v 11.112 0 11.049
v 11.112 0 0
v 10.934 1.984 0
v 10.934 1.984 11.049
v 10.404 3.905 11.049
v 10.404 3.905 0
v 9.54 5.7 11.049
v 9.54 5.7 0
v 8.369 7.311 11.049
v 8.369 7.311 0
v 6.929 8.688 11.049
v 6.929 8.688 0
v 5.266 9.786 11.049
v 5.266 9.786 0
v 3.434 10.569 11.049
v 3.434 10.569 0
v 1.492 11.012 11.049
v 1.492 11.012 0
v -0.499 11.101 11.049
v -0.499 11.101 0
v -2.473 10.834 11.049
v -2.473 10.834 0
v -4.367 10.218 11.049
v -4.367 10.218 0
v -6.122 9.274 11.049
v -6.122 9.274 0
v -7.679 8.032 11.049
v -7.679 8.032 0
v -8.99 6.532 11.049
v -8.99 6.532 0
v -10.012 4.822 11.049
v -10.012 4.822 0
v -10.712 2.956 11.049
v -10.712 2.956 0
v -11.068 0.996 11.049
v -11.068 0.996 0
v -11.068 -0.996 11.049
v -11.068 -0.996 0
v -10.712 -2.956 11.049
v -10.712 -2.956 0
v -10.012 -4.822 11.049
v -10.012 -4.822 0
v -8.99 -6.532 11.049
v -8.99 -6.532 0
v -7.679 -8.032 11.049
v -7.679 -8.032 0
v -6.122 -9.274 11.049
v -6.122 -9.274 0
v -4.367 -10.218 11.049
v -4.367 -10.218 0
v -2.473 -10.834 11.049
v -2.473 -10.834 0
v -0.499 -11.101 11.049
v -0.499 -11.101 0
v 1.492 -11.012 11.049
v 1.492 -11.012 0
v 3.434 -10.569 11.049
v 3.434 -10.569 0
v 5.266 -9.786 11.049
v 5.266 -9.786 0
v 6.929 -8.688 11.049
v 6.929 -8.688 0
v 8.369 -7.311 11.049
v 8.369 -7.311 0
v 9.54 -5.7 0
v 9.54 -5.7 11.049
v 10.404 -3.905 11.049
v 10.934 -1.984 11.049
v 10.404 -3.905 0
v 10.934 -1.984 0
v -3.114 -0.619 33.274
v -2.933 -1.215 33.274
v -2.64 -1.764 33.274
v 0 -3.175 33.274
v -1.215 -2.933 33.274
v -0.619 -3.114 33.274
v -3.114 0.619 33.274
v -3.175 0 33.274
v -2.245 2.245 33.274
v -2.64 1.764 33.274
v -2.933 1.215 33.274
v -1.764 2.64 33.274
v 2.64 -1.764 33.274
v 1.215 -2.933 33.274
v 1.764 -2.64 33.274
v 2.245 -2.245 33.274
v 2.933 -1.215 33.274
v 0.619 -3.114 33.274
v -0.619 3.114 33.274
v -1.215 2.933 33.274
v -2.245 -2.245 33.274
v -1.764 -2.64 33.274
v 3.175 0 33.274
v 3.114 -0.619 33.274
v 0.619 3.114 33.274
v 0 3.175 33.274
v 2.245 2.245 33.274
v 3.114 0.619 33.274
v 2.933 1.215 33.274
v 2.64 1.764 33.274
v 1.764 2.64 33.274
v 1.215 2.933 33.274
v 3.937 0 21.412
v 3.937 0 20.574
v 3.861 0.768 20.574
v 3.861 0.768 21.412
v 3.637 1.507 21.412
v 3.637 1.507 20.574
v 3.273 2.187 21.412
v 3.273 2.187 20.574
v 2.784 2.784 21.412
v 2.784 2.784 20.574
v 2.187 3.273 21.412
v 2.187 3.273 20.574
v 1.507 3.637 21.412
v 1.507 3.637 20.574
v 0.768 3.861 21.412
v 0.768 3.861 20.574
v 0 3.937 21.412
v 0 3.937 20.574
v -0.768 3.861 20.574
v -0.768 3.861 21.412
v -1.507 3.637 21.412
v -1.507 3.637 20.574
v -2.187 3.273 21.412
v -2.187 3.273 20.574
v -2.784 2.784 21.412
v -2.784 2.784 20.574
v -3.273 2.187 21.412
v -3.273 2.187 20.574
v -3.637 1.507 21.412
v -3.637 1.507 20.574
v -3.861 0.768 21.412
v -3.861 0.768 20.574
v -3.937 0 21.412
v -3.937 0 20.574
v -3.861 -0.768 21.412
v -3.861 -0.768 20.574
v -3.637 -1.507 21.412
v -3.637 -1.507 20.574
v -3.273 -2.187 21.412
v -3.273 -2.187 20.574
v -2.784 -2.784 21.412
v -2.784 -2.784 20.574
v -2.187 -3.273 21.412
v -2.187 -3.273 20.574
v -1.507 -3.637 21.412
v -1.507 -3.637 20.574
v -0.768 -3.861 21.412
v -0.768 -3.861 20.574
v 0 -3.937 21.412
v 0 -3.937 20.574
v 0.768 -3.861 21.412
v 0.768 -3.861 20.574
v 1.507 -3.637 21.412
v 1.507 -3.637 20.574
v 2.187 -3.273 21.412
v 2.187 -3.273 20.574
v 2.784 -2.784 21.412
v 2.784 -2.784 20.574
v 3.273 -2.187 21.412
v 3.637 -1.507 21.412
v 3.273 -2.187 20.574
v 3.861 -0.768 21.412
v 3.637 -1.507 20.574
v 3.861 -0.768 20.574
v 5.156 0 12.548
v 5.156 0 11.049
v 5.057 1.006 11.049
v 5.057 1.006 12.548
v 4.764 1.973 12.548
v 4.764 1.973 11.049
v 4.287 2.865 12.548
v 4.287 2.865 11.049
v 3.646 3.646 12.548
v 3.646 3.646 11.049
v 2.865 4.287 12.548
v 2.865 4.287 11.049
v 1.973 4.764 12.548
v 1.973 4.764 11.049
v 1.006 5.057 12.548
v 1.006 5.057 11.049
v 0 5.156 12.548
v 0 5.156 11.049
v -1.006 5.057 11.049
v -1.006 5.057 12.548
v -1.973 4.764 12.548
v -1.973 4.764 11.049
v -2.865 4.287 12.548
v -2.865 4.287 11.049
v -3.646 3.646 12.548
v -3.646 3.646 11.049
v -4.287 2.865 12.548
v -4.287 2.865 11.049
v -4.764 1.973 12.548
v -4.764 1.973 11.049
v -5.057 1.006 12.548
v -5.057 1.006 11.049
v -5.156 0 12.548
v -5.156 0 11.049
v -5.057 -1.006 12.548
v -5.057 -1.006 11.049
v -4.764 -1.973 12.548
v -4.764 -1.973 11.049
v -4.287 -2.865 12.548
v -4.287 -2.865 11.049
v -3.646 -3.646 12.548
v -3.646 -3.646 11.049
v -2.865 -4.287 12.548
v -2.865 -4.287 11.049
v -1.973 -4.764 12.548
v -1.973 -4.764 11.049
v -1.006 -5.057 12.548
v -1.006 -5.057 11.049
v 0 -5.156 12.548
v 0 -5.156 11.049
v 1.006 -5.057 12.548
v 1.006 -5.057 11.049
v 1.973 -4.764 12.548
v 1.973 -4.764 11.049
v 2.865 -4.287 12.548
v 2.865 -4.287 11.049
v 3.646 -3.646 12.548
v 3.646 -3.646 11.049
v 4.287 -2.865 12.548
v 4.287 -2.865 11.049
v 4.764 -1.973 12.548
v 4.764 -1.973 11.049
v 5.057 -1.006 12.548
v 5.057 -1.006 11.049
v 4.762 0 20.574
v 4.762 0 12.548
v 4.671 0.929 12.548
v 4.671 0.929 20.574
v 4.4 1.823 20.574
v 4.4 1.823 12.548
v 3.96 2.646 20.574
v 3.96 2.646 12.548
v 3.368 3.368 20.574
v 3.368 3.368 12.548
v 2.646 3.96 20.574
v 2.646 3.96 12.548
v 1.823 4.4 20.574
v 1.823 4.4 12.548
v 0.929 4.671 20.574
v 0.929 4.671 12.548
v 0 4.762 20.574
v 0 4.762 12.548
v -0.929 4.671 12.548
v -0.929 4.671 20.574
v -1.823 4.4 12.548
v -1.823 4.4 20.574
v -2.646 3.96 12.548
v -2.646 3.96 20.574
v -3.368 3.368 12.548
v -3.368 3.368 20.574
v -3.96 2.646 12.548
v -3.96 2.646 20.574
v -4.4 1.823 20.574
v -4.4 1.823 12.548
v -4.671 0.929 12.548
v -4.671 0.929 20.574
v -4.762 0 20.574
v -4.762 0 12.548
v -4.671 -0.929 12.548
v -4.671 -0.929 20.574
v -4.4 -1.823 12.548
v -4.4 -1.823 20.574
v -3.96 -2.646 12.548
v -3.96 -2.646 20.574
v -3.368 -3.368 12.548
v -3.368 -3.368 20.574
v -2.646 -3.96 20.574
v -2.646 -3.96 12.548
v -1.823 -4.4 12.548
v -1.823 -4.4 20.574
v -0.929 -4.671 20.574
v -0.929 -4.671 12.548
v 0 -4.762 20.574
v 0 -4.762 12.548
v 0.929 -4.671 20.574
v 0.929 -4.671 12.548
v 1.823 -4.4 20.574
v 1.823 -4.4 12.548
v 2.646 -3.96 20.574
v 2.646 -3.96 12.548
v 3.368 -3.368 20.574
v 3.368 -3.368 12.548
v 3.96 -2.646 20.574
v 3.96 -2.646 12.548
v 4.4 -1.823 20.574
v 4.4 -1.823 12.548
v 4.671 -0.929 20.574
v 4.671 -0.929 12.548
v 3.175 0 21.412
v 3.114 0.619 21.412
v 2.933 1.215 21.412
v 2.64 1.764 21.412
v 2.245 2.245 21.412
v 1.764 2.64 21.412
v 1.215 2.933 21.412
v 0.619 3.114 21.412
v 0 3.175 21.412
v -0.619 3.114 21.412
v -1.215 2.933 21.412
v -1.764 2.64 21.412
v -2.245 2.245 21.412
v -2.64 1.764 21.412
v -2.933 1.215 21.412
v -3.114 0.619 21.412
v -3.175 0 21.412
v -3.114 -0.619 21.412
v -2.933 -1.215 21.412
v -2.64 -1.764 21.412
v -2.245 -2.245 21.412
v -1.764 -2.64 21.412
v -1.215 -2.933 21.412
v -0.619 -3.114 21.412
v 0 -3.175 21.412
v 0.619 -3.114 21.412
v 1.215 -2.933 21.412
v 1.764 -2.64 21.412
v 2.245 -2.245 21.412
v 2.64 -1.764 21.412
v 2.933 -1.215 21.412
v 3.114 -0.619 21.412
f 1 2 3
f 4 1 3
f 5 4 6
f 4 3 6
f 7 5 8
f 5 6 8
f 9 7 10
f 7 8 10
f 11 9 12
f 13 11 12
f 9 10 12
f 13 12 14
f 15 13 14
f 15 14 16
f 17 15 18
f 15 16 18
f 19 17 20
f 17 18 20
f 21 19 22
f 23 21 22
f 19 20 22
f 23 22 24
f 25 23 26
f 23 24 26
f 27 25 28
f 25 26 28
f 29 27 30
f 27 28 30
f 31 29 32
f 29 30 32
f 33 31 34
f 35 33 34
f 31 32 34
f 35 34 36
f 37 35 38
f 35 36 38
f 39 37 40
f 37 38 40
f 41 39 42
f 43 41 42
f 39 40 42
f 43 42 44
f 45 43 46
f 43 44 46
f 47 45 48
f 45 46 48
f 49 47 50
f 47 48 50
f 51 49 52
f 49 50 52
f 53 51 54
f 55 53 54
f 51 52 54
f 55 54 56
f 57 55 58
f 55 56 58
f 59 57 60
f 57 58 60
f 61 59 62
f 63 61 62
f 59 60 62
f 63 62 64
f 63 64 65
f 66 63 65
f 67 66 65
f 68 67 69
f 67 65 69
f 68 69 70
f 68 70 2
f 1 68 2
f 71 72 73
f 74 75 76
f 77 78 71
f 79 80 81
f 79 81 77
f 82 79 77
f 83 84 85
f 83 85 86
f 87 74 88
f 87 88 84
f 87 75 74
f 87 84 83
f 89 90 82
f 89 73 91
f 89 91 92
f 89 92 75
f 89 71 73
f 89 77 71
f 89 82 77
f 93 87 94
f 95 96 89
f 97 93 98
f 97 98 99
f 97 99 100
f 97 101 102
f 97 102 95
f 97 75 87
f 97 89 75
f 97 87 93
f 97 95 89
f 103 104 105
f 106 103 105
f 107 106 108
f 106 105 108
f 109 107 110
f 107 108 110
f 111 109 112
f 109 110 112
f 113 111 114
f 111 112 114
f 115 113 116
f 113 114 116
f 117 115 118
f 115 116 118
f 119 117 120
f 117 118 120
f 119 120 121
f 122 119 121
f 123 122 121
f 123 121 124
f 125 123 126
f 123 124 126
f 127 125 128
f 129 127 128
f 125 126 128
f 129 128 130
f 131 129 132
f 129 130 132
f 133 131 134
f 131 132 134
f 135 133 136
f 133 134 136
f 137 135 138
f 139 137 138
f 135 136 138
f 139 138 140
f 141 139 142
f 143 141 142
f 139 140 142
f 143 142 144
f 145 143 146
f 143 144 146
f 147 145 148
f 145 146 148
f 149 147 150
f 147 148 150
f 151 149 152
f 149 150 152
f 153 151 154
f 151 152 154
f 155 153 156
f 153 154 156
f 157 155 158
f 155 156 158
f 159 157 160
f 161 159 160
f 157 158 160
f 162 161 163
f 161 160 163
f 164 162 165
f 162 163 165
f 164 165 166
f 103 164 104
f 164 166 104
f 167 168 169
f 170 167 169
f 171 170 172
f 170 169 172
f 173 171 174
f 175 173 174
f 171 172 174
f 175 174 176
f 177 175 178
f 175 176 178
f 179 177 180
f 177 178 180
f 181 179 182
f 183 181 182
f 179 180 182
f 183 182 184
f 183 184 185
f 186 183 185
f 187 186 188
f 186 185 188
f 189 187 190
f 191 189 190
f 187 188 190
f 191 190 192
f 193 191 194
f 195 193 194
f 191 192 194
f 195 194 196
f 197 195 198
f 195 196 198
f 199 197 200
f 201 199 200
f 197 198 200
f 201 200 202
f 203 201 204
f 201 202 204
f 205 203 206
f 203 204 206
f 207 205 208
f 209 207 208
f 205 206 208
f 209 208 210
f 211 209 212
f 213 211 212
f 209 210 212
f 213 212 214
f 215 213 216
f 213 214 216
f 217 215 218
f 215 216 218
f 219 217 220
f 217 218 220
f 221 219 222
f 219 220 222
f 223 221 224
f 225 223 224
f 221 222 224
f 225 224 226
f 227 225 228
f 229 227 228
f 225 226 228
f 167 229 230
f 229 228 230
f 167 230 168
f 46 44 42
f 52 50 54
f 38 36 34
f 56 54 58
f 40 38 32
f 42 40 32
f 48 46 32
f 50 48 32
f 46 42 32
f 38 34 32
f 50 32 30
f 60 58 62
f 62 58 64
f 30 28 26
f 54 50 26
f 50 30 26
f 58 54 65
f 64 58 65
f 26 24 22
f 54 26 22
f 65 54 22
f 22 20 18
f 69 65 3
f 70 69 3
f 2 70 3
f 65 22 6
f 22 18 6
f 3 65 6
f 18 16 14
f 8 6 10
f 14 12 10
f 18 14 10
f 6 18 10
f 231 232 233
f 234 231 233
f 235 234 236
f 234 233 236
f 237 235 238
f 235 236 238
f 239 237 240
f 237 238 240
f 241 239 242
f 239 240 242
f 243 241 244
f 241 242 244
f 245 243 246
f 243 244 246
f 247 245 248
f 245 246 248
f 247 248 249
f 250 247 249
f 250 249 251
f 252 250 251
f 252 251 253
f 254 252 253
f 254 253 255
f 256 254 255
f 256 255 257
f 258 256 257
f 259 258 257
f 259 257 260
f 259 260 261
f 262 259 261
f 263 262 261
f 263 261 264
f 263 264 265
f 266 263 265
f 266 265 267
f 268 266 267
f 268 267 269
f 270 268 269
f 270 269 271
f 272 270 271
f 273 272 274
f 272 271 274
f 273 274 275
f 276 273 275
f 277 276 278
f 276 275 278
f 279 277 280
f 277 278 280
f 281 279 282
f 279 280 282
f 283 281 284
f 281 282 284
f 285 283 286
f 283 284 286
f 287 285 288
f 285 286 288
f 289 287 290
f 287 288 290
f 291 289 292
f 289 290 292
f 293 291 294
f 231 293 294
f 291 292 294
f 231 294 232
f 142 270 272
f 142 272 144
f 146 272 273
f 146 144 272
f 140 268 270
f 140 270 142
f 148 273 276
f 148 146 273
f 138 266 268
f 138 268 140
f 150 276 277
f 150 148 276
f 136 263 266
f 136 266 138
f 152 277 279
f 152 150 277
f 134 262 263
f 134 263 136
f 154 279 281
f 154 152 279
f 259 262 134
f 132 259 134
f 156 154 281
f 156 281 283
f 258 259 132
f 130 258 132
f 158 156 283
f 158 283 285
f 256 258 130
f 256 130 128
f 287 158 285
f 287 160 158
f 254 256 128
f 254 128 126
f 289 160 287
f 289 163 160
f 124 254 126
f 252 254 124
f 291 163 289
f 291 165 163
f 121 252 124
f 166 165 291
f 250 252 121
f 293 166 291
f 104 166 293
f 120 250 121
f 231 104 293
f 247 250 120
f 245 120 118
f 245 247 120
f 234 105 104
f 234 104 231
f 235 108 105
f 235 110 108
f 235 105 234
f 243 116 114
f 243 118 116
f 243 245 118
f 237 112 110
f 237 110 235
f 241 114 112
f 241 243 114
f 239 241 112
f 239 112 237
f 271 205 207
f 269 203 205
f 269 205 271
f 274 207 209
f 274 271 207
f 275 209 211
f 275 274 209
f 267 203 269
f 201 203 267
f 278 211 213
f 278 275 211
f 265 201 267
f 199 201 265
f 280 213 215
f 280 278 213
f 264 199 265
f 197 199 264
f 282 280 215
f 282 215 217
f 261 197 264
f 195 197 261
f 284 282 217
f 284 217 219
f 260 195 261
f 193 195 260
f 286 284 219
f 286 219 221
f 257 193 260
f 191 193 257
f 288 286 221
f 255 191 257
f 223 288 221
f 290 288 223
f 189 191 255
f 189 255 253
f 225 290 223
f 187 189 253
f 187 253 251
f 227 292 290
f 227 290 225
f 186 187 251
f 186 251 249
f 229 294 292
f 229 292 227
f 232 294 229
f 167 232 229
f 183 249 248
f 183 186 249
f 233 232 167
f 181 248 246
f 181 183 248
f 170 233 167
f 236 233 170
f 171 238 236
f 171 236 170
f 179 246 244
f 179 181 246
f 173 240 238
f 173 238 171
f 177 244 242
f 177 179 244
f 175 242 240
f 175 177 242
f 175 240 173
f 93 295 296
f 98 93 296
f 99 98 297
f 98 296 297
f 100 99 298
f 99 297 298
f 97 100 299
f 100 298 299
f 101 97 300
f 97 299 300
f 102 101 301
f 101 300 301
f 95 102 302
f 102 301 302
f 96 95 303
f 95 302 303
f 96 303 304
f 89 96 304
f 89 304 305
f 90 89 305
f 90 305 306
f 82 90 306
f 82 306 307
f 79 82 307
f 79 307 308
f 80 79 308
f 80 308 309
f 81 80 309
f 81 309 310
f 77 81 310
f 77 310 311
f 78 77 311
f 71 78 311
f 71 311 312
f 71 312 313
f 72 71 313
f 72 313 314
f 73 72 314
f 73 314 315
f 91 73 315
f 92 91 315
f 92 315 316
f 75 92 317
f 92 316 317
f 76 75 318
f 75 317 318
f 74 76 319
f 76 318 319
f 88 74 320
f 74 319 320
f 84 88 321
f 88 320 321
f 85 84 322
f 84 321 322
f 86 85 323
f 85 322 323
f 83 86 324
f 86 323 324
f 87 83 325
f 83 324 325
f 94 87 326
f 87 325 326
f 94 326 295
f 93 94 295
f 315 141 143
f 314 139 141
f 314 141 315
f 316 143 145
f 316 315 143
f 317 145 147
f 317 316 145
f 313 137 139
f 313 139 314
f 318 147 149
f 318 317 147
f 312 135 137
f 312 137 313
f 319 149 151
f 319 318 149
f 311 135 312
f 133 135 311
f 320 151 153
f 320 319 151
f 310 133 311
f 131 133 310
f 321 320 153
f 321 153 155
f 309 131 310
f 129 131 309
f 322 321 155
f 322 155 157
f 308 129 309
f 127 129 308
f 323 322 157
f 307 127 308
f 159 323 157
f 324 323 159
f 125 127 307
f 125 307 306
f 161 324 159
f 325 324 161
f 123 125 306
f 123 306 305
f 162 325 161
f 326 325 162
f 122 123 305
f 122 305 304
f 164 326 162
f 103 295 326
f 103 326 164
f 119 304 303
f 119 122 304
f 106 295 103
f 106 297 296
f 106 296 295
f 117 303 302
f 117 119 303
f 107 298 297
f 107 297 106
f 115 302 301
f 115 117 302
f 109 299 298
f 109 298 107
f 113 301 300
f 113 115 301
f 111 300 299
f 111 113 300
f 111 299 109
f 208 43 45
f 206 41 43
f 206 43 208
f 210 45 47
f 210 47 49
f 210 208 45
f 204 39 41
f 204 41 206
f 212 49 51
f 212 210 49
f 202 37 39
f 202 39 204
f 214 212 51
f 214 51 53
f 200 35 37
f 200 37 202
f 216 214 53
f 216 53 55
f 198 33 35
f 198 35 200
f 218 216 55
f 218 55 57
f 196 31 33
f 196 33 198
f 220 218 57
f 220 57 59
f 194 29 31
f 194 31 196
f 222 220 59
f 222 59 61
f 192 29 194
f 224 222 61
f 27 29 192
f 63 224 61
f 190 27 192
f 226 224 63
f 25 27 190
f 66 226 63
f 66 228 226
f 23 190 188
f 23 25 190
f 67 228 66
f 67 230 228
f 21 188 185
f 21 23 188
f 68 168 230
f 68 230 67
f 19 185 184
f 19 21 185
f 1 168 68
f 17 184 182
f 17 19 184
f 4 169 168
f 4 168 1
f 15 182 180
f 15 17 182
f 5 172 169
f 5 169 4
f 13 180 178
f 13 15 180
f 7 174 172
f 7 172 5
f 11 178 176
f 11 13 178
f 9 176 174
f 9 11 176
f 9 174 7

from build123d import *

# Parameters (mm, degrees)
SKETCH1_R           = 11.1125
BOSS_EXTRUDE1_DEPTH = 11.049
SKETCH2_R           = 5.1562
BOSS_EXTRUDE2_DEPTH = 1.4986
SKETCH3_R           = 4.7625
BOSS_EXTRUDE5_DEPTH = 9.525
SKETCH4_R           = 3.937
BOSS_EXTRUDE6_DEPTH = 0.8382
SKETCH5_R           = 3.175
BOSS_EXTRUDE7_DEPTH = 22.225


with BuildPart() as part:
    # Sketch1 → Boss-Extrude1 (new body)
    with BuildSketch(Plane.XY):
        Circle(SKETCH1_R)
    extrude(amount=BOSS_EXTRUDE1_DEPTH)

    # Sketch2 → Boss-Extrude2 (add)
    with BuildSketch(Plane.XY.offset(11.049)):
        Circle(SKETCH2_R)
    extrude(amount=BOSS_EXTRUDE2_DEPTH)

    # Sketch3 → Boss-Extrude5 (add)
    with BuildSketch(Plane.XY.offset(11.049)):
        Circle(SKETCH3_R)
    extrude(amount=BOSS_EXTRUDE5_DEPTH)

    # Sketch4 → Boss-Extrude6 (add)
    with BuildSketch(Plane.XY.offset(20.574)):
        Circle(SKETCH4_R)
    extrude(amount=BOSS_EXTRUDE6_DEPTH)

    # Sketch5 → Boss-Extrude7 (add)
    with BuildSketch(Plane.XY.offset(11.049)):
        Circle(SKETCH5_R)
    extrude(amount=BOSS_EXTRUDE7_DEPTH)


solid = part.part
